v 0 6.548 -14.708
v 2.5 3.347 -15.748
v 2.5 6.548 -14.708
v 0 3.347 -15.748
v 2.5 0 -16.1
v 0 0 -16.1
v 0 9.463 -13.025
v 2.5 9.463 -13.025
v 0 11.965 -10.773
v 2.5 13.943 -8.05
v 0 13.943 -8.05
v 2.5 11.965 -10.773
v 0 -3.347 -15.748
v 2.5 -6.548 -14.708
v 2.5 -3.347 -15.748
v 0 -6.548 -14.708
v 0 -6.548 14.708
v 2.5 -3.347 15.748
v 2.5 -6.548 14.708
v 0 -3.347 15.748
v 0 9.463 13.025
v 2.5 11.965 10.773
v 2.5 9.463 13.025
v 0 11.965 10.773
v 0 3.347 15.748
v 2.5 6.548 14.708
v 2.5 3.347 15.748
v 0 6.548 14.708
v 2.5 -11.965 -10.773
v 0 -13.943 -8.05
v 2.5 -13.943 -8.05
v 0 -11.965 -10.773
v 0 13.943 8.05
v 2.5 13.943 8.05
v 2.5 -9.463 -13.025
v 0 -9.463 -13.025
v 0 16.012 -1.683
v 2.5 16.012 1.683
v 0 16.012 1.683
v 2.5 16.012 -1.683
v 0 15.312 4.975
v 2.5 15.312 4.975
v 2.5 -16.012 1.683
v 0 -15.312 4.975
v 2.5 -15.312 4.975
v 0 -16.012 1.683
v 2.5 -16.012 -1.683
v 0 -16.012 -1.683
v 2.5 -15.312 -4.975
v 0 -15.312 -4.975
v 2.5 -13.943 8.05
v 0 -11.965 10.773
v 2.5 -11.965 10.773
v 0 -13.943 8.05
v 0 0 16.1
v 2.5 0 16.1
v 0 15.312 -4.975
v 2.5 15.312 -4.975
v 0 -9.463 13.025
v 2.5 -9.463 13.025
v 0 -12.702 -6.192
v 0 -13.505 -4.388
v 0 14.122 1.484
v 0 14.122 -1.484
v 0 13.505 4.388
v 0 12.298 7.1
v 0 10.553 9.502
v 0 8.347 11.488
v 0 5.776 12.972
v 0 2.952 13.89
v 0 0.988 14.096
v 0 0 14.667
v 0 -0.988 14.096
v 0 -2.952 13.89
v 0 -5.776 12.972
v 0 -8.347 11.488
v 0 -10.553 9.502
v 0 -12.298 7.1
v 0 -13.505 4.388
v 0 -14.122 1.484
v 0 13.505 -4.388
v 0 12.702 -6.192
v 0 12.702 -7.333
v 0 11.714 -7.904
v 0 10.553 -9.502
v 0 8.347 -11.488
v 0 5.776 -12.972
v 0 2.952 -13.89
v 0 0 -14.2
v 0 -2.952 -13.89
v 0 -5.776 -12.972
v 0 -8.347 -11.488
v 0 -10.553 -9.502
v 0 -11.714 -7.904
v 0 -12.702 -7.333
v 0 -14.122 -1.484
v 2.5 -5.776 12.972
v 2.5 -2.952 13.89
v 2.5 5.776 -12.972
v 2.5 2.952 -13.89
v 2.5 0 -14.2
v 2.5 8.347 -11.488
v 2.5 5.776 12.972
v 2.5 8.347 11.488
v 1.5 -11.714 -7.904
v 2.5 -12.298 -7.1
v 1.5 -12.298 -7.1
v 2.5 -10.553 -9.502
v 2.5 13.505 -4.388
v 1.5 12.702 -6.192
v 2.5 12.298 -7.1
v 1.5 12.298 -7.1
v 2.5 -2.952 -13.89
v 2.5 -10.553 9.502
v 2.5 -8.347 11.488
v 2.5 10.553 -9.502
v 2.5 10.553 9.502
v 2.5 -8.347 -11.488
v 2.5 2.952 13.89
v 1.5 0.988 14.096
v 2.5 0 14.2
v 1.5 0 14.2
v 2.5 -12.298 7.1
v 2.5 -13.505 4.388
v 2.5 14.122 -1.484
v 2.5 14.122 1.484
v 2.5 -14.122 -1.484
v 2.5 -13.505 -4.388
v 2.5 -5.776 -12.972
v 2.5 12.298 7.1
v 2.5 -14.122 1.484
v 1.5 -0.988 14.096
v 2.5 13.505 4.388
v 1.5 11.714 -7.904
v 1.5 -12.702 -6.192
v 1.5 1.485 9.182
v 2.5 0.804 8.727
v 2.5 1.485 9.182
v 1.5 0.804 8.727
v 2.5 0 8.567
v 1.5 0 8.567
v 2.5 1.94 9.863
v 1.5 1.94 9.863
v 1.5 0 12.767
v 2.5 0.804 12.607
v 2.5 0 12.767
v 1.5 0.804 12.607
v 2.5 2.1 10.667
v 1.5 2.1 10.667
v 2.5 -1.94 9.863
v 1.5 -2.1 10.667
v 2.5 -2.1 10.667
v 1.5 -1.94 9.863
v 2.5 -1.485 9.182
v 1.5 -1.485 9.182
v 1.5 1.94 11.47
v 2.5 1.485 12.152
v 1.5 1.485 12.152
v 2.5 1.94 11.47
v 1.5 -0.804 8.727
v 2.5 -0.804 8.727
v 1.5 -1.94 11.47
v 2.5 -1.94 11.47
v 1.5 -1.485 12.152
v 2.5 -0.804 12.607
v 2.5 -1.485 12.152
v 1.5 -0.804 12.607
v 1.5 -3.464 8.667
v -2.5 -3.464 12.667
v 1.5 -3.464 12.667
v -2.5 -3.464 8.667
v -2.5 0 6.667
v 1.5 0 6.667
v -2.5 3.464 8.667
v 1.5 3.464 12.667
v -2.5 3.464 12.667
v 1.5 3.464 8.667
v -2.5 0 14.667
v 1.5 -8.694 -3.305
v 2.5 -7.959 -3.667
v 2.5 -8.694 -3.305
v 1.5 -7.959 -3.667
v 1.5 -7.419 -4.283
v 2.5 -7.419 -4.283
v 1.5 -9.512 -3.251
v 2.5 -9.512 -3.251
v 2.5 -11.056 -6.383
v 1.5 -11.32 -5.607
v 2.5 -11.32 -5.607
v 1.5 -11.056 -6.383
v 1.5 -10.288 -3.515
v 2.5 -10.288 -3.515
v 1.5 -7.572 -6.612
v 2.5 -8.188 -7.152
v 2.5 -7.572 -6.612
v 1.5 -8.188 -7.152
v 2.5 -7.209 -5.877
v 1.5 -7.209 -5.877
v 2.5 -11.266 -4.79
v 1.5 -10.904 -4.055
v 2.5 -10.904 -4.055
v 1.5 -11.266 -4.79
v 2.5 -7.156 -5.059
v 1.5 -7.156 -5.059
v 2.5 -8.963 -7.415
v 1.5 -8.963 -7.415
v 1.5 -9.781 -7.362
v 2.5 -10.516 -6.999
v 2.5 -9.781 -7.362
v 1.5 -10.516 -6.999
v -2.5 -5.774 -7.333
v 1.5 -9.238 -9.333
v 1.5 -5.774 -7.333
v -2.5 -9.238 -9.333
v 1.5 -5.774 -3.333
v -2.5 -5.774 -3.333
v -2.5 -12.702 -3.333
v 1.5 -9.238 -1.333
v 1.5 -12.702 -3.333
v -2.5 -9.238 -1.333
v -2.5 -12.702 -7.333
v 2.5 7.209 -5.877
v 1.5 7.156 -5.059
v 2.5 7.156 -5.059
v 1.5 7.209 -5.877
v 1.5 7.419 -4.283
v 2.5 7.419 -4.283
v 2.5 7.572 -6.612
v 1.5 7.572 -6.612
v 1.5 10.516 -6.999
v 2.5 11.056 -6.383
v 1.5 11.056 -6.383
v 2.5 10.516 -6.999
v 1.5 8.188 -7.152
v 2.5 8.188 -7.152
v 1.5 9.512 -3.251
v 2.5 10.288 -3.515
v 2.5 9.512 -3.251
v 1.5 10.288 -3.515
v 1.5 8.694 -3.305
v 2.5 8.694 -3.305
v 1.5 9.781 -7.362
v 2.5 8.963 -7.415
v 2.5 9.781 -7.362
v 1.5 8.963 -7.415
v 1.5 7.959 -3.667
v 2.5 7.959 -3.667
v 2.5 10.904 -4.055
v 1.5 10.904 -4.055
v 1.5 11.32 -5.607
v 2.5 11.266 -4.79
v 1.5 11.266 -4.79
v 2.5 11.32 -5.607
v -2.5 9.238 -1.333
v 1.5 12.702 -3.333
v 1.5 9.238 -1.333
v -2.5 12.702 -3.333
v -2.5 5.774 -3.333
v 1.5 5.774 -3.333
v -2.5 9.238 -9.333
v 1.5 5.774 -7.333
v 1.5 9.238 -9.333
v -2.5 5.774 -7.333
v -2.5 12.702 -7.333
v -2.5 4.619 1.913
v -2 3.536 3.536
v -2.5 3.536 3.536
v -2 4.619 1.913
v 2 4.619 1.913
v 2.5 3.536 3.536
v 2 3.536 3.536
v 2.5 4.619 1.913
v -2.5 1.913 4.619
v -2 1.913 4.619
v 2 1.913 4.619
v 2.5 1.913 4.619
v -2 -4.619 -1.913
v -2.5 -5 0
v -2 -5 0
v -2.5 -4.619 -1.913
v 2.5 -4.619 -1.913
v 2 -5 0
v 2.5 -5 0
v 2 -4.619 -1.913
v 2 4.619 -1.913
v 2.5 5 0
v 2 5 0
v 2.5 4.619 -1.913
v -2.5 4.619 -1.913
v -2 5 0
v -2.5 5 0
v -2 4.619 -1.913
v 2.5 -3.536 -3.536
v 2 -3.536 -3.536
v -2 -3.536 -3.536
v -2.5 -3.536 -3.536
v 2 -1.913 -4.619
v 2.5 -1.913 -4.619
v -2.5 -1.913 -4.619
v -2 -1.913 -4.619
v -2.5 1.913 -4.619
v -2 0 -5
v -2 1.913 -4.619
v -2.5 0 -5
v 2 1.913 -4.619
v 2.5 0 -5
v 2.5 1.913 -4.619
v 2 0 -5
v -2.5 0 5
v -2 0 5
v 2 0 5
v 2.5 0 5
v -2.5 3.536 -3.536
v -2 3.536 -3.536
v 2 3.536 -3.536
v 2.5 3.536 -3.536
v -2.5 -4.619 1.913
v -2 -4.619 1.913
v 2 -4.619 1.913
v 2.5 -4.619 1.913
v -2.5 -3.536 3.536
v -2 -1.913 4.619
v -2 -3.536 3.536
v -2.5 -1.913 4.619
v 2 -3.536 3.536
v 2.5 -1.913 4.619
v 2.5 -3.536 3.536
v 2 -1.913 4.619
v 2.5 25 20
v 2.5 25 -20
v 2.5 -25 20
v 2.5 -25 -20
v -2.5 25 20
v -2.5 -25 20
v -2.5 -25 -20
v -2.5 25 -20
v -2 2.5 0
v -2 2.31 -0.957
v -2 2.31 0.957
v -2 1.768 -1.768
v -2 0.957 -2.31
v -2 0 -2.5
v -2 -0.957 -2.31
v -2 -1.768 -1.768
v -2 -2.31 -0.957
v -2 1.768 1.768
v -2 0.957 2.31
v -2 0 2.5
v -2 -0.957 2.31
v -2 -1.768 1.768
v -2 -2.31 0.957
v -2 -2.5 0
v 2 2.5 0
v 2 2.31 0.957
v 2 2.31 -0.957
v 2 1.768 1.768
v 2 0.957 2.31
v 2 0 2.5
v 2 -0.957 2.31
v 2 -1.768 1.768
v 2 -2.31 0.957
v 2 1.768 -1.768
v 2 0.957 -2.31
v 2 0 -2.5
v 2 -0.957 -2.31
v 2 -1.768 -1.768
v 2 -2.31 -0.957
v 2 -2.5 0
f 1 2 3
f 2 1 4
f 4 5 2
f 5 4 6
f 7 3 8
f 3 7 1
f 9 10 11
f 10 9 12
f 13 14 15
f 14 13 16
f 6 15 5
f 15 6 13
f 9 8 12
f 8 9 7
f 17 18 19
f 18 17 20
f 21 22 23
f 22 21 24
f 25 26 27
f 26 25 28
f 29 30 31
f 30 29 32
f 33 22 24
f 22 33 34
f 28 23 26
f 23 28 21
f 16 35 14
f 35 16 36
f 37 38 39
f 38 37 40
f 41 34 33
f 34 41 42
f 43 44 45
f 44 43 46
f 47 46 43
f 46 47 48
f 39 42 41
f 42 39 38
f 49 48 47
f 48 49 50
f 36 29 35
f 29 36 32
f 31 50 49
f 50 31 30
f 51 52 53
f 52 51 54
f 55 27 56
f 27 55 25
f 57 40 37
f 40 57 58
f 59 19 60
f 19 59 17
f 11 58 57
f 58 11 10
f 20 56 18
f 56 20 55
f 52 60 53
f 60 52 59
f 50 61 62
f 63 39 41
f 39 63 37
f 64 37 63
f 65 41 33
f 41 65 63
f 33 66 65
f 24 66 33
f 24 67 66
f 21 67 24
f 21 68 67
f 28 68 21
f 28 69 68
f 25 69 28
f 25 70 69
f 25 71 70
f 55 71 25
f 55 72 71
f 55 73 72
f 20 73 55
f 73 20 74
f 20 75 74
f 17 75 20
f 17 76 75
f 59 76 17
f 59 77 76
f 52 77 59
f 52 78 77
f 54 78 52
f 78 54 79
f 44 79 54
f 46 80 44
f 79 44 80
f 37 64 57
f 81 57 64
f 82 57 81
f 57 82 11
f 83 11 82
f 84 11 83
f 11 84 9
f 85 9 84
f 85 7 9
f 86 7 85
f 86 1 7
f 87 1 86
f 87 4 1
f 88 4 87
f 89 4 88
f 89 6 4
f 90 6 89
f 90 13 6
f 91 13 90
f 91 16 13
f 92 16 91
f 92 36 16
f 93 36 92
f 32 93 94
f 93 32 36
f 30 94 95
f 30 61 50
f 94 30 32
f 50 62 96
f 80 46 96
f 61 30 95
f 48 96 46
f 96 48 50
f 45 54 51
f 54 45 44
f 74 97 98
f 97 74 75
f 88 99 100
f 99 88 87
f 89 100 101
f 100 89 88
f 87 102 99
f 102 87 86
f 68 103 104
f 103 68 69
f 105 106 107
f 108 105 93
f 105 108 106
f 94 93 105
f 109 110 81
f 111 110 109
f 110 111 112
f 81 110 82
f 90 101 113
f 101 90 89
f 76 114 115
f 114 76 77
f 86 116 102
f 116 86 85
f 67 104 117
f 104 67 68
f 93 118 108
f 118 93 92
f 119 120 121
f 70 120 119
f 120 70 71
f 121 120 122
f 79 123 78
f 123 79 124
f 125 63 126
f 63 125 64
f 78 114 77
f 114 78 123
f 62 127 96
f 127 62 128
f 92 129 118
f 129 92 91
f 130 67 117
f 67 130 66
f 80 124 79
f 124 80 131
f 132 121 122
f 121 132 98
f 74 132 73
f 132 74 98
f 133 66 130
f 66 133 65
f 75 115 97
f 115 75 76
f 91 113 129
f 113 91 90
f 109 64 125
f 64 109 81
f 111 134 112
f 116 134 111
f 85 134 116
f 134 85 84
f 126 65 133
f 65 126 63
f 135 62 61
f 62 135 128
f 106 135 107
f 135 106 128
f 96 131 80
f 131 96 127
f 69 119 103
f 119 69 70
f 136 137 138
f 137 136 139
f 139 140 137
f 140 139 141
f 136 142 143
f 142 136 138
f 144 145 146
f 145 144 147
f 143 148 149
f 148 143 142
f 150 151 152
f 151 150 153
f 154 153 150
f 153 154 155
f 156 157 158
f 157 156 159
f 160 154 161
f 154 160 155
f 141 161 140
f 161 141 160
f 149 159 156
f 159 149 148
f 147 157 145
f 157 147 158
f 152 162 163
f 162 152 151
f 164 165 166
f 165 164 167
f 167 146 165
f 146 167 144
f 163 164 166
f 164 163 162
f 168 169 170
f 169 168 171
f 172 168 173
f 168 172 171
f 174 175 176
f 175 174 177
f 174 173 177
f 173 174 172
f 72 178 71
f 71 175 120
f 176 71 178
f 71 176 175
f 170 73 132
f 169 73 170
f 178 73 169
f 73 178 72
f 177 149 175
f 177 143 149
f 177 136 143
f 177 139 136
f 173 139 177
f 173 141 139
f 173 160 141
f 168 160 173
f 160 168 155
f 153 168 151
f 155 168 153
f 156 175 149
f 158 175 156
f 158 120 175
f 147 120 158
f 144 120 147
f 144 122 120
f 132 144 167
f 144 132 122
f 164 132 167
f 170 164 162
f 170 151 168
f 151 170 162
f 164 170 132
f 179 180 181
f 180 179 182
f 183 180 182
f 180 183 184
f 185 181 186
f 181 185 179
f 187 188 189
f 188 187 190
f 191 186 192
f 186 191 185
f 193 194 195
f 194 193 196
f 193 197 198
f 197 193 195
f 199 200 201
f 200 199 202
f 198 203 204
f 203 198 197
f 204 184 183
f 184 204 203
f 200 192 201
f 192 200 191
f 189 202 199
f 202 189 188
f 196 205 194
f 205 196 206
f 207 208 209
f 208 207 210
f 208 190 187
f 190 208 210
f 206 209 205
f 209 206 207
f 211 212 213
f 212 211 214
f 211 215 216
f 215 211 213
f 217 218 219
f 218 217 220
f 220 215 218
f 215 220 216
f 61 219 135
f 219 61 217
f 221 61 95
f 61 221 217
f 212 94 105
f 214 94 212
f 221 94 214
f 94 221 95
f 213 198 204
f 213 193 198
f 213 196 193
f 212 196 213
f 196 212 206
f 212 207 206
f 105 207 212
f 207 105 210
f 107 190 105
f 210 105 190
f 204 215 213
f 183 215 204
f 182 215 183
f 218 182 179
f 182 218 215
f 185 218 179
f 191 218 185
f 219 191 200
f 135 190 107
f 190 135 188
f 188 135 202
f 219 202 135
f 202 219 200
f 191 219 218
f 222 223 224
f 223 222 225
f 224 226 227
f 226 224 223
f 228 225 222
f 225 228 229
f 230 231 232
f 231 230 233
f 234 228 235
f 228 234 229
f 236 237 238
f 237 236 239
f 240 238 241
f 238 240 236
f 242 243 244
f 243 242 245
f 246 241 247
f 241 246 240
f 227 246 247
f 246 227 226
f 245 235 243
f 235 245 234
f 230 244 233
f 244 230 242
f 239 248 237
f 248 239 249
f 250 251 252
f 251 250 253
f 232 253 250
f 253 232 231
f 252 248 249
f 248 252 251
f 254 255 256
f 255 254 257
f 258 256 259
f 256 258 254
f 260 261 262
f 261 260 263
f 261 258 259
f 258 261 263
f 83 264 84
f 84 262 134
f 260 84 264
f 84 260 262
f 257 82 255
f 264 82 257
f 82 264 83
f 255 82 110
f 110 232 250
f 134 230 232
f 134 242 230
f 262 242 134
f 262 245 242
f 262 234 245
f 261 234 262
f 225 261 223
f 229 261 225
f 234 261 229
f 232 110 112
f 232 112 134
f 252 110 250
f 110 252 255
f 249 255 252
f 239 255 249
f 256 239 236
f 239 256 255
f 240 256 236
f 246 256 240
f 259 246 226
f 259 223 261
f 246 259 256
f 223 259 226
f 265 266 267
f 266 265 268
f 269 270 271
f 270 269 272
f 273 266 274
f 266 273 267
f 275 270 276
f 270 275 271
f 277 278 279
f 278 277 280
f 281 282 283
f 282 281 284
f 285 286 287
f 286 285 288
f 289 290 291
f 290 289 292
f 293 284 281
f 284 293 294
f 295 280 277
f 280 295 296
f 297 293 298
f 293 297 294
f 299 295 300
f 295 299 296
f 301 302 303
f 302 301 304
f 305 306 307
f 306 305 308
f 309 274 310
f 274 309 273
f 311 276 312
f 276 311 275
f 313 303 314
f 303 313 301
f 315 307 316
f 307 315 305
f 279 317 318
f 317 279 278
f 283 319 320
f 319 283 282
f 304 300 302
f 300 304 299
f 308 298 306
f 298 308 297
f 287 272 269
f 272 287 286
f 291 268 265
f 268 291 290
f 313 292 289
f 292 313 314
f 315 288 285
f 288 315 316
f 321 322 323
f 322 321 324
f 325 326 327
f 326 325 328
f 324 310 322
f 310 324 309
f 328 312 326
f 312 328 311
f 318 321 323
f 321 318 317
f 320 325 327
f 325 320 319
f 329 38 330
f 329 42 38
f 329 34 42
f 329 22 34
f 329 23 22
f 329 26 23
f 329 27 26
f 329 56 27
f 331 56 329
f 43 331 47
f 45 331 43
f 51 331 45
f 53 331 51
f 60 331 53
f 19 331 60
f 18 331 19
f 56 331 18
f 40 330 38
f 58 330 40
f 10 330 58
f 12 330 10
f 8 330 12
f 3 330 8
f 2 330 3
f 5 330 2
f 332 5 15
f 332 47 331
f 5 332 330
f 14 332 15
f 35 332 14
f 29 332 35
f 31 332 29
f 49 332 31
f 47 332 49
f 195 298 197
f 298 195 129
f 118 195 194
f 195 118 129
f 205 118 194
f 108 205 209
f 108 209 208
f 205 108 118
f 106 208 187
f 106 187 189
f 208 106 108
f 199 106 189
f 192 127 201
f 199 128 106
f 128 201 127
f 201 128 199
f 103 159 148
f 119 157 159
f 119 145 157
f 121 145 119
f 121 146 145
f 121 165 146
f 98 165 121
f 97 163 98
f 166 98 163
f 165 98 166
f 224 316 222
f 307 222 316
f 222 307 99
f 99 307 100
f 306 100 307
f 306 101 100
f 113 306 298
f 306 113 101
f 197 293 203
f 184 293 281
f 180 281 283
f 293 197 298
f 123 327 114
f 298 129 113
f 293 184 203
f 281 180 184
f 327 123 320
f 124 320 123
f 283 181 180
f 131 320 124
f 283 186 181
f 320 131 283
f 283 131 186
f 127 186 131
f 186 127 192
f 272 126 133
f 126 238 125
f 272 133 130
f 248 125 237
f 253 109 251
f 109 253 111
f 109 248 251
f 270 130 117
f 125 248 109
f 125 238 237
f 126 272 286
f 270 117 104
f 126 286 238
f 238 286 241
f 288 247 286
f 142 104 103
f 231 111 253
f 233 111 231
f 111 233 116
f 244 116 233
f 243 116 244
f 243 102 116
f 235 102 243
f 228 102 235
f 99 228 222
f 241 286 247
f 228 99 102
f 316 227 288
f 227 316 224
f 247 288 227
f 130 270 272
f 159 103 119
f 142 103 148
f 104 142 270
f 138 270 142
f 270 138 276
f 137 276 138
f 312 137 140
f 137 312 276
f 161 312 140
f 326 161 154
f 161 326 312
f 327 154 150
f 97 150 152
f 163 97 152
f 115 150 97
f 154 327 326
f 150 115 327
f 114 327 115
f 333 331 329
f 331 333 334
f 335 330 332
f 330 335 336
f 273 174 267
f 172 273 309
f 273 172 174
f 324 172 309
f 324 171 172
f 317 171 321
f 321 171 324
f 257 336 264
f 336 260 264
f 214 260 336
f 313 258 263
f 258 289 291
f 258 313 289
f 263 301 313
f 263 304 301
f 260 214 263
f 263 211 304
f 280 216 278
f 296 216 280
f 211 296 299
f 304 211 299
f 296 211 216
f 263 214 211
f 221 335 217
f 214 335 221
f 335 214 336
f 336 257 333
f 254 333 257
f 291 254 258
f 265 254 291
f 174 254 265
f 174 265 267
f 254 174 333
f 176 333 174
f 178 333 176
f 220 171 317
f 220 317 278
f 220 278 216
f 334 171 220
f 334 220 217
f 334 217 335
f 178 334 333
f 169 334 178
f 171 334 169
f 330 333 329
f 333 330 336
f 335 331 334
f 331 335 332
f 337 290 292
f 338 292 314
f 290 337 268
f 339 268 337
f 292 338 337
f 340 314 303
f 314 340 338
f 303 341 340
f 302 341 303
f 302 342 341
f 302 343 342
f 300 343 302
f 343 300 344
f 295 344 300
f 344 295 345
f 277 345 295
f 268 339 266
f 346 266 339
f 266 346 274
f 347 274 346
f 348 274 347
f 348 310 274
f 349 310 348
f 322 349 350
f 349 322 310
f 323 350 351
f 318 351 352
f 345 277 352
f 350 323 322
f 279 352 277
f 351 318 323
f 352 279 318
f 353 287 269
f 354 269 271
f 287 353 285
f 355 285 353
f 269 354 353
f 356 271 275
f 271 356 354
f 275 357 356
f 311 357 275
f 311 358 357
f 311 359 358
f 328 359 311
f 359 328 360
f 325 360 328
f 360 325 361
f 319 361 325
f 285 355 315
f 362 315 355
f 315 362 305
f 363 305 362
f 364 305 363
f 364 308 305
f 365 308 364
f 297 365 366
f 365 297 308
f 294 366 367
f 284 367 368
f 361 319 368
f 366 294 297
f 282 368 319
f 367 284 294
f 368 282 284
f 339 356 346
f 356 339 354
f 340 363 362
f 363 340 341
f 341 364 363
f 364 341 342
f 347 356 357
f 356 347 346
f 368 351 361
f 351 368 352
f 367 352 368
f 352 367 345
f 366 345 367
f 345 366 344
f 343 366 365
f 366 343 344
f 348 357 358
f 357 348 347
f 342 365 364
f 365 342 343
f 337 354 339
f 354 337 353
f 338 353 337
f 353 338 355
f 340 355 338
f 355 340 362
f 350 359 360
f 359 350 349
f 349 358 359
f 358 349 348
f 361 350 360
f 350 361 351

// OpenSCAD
// file: Bearings.scad
/*
 * Used bearings:
 *  MR105ZZ - 10x5x4
 */

cylinderFn = 16;

function BearingMR105ZZDiameter() = 10;
 
module BearingMR105ZZ() {
	height = 4;
	inner = 5;
	color ("silver") difference() {
		cylinder(d = BearingMR105ZZDiameter(), h = height, center = true, $fn=cylinderFn);
		translate([0,0,-0.1]) cylinder(d = inner, h = height+0.3, center = true, $fn=cylinderFn);
	}
}
// main file
/*
 * PVC pipes
 */
use <Bearings.scad>;

PIPE_HOLDER_WIDTH = 5;
function PVC_PIPE_DIAMETER() = 32;
function THREADED_ROD_DIAMETER() = 4; // M4

module Pipe( dia=10, w=1, len=100) {
	difference() {
		cylinder(h=len,r=dia/2);
		translate ([0,0,-1]) {
			cylinder(h=len+2,r=dia/2 - w);
		}
	}
}
 
module Pipe32(len = 100) {
    Pipe(dia=32.2, w=1.9, len=len);
}

module PipeHolder(h=40, w=50) {
    difference() {
        cube([PIPE_HOLDER_WIDTH,w,h], center=true);
        PipeHolderMinus(w=PIPE_HOLDER_WIDTH);
    }
    rotate([0,90,0])
        BearingMR105ZZ();
}

module PipeHolderMinus(w=10, bearing = 2) {
    rotate([0,90,0])
	translate([0,0,-bearing/3])
        	cylinder(d = BearingMR105ZZDiameter(), h = w+bearing, center = true);
        rotate([0,90,0])
            Pipe32(len=w);
        for(i=[0,120,240]) {
            rotate([i,0,0]) 
                translate([-1,0,(PVC_PIPE_DIAMETER()/3)])
                    rotate([0,90,0]) translate([0,0,-(w/2)])
                        union() {
                            cylinder(h=10,d=THREADED_ROD_DIAMETER()+0.2, $fn =16);
                            translate([0,0,-5])
                            cylinder(d=8,h=10,$fn=6);
                        }
        }

}

PipeHolder();
